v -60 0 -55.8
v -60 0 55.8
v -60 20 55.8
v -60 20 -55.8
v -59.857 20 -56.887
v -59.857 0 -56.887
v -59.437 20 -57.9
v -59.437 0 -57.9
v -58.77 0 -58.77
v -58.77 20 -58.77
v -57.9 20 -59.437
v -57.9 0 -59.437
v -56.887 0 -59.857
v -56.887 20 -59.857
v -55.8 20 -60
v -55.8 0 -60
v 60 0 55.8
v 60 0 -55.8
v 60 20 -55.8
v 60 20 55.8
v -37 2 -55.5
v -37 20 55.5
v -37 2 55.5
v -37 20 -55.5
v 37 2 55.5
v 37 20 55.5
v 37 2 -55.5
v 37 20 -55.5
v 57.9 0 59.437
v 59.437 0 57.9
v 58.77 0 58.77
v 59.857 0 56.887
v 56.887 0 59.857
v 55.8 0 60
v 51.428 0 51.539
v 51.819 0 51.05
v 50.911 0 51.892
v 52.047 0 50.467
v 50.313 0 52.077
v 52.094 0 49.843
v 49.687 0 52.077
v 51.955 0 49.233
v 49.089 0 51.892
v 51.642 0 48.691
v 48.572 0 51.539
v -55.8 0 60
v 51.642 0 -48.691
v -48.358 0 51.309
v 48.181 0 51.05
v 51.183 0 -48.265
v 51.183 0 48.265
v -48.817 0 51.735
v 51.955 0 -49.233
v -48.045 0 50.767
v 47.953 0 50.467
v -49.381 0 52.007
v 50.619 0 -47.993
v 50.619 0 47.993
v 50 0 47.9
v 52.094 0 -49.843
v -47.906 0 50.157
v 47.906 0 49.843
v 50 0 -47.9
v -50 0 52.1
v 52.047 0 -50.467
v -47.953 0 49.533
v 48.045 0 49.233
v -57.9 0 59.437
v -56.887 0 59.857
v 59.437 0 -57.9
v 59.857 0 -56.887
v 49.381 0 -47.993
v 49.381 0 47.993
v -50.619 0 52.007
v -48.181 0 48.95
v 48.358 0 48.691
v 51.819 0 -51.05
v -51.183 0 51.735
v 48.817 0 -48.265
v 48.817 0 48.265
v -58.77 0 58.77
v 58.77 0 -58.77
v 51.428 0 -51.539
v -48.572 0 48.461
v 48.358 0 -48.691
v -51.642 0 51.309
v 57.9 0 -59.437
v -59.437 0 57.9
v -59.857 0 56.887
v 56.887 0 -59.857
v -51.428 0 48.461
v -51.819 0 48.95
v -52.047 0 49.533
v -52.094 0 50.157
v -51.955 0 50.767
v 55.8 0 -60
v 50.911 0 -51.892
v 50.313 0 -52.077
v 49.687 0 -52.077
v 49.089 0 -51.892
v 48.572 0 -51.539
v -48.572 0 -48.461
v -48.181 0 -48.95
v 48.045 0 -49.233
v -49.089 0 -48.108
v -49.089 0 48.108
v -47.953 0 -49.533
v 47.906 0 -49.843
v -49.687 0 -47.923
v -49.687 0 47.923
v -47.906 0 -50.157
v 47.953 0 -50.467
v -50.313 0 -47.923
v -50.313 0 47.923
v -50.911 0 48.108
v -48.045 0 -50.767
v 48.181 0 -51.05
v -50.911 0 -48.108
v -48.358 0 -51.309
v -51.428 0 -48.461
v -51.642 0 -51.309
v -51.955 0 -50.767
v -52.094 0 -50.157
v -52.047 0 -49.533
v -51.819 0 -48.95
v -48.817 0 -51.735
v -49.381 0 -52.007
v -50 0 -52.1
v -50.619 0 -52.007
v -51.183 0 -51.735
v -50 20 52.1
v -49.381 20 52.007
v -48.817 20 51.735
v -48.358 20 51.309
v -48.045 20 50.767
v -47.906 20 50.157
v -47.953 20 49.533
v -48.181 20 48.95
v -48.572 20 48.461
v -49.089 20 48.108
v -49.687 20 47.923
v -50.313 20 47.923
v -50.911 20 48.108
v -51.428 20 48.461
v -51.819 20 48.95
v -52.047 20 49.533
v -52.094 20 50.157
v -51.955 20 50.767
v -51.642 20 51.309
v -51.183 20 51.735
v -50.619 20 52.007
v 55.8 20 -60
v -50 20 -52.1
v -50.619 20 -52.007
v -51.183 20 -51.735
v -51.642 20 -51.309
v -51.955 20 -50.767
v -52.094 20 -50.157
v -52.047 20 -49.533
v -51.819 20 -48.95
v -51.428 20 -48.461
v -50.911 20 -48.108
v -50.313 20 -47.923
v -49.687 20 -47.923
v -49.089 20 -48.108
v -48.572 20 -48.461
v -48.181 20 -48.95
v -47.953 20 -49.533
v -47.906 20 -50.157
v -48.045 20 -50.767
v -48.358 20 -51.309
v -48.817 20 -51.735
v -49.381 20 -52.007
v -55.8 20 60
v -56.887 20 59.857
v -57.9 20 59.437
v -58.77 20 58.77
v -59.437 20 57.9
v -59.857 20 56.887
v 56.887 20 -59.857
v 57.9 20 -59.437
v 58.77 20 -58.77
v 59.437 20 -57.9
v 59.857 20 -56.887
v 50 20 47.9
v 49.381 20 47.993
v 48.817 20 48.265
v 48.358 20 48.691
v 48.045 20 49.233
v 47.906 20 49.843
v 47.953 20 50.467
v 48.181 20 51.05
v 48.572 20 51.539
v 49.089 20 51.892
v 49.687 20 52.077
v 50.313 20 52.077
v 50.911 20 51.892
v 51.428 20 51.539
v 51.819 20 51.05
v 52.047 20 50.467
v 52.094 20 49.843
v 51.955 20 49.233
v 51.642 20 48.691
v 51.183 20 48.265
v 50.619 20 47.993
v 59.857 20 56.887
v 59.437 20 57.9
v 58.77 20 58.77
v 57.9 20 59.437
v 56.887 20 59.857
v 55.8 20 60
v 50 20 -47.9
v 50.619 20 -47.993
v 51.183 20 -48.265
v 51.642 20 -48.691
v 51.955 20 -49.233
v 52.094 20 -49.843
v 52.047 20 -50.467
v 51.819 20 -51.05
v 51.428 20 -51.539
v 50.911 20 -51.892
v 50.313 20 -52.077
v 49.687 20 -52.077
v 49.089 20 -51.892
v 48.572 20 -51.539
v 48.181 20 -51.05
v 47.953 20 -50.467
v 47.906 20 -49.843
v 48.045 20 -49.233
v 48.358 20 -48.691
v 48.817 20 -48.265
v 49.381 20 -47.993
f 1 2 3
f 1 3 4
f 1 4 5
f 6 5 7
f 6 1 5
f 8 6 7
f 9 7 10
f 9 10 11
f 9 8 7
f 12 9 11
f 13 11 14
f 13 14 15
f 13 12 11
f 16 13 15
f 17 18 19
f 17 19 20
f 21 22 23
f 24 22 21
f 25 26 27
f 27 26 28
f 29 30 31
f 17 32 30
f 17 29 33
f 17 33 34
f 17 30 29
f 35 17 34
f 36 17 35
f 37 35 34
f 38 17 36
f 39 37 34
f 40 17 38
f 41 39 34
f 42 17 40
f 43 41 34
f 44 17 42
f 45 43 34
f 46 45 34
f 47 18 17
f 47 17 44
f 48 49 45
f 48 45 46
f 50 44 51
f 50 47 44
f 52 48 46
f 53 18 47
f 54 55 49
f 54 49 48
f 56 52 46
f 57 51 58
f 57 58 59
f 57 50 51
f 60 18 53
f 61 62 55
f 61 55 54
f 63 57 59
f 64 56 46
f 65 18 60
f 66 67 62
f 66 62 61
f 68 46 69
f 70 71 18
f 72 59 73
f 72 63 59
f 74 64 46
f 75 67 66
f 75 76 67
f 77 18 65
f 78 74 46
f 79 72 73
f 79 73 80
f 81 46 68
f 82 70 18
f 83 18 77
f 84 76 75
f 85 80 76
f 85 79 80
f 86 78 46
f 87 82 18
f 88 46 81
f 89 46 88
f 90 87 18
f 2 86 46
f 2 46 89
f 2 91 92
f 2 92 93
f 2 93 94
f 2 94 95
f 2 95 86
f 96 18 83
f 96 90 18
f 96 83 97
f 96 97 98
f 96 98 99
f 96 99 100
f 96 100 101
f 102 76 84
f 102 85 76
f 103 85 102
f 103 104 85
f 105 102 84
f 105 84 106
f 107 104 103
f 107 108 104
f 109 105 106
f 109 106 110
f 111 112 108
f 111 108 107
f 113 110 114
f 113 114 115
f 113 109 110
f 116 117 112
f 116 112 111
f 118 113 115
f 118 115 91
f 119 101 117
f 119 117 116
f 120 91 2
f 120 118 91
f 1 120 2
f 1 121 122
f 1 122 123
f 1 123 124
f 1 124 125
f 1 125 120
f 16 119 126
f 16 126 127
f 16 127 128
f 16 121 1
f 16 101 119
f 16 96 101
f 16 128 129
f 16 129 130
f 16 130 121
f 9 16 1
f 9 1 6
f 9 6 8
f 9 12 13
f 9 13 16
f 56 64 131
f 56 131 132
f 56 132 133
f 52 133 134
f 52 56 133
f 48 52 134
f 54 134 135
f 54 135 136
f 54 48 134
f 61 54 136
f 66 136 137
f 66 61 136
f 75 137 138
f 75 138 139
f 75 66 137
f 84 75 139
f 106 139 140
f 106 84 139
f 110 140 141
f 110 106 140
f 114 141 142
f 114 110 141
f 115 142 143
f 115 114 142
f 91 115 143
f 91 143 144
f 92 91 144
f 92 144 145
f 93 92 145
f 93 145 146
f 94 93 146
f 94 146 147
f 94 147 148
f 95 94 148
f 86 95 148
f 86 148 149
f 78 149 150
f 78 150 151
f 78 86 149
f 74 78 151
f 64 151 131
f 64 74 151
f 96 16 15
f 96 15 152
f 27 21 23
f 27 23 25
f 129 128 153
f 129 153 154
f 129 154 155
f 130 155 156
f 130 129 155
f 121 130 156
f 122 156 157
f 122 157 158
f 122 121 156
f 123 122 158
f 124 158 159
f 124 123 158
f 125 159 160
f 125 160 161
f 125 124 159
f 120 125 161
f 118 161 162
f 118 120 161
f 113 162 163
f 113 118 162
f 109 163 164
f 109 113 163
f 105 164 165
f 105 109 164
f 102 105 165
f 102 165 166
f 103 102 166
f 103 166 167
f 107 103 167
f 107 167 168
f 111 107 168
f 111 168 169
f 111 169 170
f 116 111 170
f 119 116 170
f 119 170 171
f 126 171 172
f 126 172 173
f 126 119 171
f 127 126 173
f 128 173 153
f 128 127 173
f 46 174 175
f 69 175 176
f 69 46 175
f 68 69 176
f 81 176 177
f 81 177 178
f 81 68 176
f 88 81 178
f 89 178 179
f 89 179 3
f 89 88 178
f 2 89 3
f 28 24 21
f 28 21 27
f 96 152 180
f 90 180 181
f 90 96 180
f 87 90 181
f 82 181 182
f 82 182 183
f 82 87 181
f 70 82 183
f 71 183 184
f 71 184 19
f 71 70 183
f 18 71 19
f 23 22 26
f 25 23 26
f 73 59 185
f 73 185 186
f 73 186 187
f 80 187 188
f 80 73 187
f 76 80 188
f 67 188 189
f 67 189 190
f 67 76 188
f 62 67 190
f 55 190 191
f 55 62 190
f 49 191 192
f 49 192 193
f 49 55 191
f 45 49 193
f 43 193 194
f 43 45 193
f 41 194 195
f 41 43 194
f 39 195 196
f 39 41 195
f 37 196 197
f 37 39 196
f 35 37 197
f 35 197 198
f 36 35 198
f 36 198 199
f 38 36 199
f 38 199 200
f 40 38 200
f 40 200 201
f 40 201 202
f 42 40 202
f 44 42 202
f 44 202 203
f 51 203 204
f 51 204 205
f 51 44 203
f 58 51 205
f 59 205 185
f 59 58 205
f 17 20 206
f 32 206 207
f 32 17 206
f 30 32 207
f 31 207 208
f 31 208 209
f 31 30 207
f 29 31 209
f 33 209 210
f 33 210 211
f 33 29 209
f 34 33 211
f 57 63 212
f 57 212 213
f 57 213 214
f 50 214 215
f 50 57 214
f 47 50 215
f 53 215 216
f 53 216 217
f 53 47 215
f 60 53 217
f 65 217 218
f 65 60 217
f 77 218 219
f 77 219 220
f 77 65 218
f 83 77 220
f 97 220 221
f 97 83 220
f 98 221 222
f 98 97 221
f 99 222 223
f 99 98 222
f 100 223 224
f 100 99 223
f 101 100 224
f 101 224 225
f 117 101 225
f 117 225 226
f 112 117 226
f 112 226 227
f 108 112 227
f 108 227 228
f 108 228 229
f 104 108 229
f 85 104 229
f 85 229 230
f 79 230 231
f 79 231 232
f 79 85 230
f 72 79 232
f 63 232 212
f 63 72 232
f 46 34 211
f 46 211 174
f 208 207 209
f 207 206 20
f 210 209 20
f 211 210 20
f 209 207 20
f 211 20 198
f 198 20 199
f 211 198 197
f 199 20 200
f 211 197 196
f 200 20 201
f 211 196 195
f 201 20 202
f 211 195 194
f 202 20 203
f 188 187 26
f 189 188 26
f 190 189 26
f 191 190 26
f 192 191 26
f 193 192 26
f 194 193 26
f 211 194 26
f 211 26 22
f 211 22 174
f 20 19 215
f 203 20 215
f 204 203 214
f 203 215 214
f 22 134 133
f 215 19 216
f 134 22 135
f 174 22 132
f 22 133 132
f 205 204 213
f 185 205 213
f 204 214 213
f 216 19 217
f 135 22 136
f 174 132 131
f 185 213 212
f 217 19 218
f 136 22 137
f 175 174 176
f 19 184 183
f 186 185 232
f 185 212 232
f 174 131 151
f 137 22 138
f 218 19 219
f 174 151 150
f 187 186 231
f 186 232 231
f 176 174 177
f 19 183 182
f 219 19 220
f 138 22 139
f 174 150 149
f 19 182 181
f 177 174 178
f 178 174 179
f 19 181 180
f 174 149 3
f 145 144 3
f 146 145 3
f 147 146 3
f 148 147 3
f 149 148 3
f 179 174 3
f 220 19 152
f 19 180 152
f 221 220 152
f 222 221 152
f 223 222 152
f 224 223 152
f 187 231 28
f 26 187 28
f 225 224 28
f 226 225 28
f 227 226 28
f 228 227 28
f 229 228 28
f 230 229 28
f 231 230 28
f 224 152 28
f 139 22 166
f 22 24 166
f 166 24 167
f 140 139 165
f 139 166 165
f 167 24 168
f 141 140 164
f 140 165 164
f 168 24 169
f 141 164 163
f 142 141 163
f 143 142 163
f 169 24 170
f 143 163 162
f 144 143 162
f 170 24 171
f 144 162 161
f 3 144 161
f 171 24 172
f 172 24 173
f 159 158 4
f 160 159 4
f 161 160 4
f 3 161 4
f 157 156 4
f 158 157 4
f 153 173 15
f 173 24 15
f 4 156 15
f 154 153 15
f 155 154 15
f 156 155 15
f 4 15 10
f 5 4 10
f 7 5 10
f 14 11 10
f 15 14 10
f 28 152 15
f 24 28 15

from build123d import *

# Parameters (mm, degrees)
SKETCH1_R           = 2.1
BOSS_EXTRUDE1_DEPTH = 20
SKETCH2_W           = 74
SKETCH2_H           = 111
CUT_EXTRUDE1_DEPTH  = 18


with BuildPart() as part:
    # Sketch1 → Boss-Extrude1 (new body)
    with BuildSketch(Plane(origin=(0, 0, 0), x_dir=(1, 0, 0), z_dir=(0, 1, 0))):
        with BuildLine():
            Line((-55.8, 60), (55.8, 60))
            ThreePointArc((55.8, 60), (58.769848481, 58.769848481), (60, 55.8))
            Line((60, 55.8), (60, -55.8))
            ThreePointArc((60, -55.8), (58.769848481, -58.769848481), (55.8, -60))
            Line((55.8, -60), (-55.8, -60))
            ThreePointArc((-55.8, -60), (-58.769848481, -58.769848481), (-60, -55.8))
            Line((-60, -55.8), (-60, 55.8))
            ThreePointArc((-60, 55.8), (-58.769848481, 58.769848481), (-55.8, 60))
        make_face()
        with Locations(Location((50, 50, 0), (0, 0, 270))):
            Circle(SKETCH1_R, mode=Mode.SUBTRACT)
        with Locations(Location((-50, 50, 0), (0, 0, 90))):
            Circle(SKETCH1_R, mode=Mode.SUBTRACT)
        with Locations(Location((50, -50, 0), (0, 0, 90))):
            Circle(SKETCH1_R, mode=Mode.SUBTRACT)
        with Locations(Location((-50, -50, 0), (0, 0, 270))):
            Circle(SKETCH1_R, mode=Mode.SUBTRACT)
    extrude(amount=BOSS_EXTRUDE1_DEPTH)

    # Sketch2 → Cut-Extrude1 (cut)
    with BuildSketch(Plane(origin=(0, 20, 0), x_dir=(1, 0, 0), z_dir=(0, 1, 0))):
        Rectangle(SKETCH2_W, SKETCH2_H)
    extrude(amount=-CUT_EXTRUDE1_DEPTH, mode=Mode.SUBTRACT)


solid = part.part
